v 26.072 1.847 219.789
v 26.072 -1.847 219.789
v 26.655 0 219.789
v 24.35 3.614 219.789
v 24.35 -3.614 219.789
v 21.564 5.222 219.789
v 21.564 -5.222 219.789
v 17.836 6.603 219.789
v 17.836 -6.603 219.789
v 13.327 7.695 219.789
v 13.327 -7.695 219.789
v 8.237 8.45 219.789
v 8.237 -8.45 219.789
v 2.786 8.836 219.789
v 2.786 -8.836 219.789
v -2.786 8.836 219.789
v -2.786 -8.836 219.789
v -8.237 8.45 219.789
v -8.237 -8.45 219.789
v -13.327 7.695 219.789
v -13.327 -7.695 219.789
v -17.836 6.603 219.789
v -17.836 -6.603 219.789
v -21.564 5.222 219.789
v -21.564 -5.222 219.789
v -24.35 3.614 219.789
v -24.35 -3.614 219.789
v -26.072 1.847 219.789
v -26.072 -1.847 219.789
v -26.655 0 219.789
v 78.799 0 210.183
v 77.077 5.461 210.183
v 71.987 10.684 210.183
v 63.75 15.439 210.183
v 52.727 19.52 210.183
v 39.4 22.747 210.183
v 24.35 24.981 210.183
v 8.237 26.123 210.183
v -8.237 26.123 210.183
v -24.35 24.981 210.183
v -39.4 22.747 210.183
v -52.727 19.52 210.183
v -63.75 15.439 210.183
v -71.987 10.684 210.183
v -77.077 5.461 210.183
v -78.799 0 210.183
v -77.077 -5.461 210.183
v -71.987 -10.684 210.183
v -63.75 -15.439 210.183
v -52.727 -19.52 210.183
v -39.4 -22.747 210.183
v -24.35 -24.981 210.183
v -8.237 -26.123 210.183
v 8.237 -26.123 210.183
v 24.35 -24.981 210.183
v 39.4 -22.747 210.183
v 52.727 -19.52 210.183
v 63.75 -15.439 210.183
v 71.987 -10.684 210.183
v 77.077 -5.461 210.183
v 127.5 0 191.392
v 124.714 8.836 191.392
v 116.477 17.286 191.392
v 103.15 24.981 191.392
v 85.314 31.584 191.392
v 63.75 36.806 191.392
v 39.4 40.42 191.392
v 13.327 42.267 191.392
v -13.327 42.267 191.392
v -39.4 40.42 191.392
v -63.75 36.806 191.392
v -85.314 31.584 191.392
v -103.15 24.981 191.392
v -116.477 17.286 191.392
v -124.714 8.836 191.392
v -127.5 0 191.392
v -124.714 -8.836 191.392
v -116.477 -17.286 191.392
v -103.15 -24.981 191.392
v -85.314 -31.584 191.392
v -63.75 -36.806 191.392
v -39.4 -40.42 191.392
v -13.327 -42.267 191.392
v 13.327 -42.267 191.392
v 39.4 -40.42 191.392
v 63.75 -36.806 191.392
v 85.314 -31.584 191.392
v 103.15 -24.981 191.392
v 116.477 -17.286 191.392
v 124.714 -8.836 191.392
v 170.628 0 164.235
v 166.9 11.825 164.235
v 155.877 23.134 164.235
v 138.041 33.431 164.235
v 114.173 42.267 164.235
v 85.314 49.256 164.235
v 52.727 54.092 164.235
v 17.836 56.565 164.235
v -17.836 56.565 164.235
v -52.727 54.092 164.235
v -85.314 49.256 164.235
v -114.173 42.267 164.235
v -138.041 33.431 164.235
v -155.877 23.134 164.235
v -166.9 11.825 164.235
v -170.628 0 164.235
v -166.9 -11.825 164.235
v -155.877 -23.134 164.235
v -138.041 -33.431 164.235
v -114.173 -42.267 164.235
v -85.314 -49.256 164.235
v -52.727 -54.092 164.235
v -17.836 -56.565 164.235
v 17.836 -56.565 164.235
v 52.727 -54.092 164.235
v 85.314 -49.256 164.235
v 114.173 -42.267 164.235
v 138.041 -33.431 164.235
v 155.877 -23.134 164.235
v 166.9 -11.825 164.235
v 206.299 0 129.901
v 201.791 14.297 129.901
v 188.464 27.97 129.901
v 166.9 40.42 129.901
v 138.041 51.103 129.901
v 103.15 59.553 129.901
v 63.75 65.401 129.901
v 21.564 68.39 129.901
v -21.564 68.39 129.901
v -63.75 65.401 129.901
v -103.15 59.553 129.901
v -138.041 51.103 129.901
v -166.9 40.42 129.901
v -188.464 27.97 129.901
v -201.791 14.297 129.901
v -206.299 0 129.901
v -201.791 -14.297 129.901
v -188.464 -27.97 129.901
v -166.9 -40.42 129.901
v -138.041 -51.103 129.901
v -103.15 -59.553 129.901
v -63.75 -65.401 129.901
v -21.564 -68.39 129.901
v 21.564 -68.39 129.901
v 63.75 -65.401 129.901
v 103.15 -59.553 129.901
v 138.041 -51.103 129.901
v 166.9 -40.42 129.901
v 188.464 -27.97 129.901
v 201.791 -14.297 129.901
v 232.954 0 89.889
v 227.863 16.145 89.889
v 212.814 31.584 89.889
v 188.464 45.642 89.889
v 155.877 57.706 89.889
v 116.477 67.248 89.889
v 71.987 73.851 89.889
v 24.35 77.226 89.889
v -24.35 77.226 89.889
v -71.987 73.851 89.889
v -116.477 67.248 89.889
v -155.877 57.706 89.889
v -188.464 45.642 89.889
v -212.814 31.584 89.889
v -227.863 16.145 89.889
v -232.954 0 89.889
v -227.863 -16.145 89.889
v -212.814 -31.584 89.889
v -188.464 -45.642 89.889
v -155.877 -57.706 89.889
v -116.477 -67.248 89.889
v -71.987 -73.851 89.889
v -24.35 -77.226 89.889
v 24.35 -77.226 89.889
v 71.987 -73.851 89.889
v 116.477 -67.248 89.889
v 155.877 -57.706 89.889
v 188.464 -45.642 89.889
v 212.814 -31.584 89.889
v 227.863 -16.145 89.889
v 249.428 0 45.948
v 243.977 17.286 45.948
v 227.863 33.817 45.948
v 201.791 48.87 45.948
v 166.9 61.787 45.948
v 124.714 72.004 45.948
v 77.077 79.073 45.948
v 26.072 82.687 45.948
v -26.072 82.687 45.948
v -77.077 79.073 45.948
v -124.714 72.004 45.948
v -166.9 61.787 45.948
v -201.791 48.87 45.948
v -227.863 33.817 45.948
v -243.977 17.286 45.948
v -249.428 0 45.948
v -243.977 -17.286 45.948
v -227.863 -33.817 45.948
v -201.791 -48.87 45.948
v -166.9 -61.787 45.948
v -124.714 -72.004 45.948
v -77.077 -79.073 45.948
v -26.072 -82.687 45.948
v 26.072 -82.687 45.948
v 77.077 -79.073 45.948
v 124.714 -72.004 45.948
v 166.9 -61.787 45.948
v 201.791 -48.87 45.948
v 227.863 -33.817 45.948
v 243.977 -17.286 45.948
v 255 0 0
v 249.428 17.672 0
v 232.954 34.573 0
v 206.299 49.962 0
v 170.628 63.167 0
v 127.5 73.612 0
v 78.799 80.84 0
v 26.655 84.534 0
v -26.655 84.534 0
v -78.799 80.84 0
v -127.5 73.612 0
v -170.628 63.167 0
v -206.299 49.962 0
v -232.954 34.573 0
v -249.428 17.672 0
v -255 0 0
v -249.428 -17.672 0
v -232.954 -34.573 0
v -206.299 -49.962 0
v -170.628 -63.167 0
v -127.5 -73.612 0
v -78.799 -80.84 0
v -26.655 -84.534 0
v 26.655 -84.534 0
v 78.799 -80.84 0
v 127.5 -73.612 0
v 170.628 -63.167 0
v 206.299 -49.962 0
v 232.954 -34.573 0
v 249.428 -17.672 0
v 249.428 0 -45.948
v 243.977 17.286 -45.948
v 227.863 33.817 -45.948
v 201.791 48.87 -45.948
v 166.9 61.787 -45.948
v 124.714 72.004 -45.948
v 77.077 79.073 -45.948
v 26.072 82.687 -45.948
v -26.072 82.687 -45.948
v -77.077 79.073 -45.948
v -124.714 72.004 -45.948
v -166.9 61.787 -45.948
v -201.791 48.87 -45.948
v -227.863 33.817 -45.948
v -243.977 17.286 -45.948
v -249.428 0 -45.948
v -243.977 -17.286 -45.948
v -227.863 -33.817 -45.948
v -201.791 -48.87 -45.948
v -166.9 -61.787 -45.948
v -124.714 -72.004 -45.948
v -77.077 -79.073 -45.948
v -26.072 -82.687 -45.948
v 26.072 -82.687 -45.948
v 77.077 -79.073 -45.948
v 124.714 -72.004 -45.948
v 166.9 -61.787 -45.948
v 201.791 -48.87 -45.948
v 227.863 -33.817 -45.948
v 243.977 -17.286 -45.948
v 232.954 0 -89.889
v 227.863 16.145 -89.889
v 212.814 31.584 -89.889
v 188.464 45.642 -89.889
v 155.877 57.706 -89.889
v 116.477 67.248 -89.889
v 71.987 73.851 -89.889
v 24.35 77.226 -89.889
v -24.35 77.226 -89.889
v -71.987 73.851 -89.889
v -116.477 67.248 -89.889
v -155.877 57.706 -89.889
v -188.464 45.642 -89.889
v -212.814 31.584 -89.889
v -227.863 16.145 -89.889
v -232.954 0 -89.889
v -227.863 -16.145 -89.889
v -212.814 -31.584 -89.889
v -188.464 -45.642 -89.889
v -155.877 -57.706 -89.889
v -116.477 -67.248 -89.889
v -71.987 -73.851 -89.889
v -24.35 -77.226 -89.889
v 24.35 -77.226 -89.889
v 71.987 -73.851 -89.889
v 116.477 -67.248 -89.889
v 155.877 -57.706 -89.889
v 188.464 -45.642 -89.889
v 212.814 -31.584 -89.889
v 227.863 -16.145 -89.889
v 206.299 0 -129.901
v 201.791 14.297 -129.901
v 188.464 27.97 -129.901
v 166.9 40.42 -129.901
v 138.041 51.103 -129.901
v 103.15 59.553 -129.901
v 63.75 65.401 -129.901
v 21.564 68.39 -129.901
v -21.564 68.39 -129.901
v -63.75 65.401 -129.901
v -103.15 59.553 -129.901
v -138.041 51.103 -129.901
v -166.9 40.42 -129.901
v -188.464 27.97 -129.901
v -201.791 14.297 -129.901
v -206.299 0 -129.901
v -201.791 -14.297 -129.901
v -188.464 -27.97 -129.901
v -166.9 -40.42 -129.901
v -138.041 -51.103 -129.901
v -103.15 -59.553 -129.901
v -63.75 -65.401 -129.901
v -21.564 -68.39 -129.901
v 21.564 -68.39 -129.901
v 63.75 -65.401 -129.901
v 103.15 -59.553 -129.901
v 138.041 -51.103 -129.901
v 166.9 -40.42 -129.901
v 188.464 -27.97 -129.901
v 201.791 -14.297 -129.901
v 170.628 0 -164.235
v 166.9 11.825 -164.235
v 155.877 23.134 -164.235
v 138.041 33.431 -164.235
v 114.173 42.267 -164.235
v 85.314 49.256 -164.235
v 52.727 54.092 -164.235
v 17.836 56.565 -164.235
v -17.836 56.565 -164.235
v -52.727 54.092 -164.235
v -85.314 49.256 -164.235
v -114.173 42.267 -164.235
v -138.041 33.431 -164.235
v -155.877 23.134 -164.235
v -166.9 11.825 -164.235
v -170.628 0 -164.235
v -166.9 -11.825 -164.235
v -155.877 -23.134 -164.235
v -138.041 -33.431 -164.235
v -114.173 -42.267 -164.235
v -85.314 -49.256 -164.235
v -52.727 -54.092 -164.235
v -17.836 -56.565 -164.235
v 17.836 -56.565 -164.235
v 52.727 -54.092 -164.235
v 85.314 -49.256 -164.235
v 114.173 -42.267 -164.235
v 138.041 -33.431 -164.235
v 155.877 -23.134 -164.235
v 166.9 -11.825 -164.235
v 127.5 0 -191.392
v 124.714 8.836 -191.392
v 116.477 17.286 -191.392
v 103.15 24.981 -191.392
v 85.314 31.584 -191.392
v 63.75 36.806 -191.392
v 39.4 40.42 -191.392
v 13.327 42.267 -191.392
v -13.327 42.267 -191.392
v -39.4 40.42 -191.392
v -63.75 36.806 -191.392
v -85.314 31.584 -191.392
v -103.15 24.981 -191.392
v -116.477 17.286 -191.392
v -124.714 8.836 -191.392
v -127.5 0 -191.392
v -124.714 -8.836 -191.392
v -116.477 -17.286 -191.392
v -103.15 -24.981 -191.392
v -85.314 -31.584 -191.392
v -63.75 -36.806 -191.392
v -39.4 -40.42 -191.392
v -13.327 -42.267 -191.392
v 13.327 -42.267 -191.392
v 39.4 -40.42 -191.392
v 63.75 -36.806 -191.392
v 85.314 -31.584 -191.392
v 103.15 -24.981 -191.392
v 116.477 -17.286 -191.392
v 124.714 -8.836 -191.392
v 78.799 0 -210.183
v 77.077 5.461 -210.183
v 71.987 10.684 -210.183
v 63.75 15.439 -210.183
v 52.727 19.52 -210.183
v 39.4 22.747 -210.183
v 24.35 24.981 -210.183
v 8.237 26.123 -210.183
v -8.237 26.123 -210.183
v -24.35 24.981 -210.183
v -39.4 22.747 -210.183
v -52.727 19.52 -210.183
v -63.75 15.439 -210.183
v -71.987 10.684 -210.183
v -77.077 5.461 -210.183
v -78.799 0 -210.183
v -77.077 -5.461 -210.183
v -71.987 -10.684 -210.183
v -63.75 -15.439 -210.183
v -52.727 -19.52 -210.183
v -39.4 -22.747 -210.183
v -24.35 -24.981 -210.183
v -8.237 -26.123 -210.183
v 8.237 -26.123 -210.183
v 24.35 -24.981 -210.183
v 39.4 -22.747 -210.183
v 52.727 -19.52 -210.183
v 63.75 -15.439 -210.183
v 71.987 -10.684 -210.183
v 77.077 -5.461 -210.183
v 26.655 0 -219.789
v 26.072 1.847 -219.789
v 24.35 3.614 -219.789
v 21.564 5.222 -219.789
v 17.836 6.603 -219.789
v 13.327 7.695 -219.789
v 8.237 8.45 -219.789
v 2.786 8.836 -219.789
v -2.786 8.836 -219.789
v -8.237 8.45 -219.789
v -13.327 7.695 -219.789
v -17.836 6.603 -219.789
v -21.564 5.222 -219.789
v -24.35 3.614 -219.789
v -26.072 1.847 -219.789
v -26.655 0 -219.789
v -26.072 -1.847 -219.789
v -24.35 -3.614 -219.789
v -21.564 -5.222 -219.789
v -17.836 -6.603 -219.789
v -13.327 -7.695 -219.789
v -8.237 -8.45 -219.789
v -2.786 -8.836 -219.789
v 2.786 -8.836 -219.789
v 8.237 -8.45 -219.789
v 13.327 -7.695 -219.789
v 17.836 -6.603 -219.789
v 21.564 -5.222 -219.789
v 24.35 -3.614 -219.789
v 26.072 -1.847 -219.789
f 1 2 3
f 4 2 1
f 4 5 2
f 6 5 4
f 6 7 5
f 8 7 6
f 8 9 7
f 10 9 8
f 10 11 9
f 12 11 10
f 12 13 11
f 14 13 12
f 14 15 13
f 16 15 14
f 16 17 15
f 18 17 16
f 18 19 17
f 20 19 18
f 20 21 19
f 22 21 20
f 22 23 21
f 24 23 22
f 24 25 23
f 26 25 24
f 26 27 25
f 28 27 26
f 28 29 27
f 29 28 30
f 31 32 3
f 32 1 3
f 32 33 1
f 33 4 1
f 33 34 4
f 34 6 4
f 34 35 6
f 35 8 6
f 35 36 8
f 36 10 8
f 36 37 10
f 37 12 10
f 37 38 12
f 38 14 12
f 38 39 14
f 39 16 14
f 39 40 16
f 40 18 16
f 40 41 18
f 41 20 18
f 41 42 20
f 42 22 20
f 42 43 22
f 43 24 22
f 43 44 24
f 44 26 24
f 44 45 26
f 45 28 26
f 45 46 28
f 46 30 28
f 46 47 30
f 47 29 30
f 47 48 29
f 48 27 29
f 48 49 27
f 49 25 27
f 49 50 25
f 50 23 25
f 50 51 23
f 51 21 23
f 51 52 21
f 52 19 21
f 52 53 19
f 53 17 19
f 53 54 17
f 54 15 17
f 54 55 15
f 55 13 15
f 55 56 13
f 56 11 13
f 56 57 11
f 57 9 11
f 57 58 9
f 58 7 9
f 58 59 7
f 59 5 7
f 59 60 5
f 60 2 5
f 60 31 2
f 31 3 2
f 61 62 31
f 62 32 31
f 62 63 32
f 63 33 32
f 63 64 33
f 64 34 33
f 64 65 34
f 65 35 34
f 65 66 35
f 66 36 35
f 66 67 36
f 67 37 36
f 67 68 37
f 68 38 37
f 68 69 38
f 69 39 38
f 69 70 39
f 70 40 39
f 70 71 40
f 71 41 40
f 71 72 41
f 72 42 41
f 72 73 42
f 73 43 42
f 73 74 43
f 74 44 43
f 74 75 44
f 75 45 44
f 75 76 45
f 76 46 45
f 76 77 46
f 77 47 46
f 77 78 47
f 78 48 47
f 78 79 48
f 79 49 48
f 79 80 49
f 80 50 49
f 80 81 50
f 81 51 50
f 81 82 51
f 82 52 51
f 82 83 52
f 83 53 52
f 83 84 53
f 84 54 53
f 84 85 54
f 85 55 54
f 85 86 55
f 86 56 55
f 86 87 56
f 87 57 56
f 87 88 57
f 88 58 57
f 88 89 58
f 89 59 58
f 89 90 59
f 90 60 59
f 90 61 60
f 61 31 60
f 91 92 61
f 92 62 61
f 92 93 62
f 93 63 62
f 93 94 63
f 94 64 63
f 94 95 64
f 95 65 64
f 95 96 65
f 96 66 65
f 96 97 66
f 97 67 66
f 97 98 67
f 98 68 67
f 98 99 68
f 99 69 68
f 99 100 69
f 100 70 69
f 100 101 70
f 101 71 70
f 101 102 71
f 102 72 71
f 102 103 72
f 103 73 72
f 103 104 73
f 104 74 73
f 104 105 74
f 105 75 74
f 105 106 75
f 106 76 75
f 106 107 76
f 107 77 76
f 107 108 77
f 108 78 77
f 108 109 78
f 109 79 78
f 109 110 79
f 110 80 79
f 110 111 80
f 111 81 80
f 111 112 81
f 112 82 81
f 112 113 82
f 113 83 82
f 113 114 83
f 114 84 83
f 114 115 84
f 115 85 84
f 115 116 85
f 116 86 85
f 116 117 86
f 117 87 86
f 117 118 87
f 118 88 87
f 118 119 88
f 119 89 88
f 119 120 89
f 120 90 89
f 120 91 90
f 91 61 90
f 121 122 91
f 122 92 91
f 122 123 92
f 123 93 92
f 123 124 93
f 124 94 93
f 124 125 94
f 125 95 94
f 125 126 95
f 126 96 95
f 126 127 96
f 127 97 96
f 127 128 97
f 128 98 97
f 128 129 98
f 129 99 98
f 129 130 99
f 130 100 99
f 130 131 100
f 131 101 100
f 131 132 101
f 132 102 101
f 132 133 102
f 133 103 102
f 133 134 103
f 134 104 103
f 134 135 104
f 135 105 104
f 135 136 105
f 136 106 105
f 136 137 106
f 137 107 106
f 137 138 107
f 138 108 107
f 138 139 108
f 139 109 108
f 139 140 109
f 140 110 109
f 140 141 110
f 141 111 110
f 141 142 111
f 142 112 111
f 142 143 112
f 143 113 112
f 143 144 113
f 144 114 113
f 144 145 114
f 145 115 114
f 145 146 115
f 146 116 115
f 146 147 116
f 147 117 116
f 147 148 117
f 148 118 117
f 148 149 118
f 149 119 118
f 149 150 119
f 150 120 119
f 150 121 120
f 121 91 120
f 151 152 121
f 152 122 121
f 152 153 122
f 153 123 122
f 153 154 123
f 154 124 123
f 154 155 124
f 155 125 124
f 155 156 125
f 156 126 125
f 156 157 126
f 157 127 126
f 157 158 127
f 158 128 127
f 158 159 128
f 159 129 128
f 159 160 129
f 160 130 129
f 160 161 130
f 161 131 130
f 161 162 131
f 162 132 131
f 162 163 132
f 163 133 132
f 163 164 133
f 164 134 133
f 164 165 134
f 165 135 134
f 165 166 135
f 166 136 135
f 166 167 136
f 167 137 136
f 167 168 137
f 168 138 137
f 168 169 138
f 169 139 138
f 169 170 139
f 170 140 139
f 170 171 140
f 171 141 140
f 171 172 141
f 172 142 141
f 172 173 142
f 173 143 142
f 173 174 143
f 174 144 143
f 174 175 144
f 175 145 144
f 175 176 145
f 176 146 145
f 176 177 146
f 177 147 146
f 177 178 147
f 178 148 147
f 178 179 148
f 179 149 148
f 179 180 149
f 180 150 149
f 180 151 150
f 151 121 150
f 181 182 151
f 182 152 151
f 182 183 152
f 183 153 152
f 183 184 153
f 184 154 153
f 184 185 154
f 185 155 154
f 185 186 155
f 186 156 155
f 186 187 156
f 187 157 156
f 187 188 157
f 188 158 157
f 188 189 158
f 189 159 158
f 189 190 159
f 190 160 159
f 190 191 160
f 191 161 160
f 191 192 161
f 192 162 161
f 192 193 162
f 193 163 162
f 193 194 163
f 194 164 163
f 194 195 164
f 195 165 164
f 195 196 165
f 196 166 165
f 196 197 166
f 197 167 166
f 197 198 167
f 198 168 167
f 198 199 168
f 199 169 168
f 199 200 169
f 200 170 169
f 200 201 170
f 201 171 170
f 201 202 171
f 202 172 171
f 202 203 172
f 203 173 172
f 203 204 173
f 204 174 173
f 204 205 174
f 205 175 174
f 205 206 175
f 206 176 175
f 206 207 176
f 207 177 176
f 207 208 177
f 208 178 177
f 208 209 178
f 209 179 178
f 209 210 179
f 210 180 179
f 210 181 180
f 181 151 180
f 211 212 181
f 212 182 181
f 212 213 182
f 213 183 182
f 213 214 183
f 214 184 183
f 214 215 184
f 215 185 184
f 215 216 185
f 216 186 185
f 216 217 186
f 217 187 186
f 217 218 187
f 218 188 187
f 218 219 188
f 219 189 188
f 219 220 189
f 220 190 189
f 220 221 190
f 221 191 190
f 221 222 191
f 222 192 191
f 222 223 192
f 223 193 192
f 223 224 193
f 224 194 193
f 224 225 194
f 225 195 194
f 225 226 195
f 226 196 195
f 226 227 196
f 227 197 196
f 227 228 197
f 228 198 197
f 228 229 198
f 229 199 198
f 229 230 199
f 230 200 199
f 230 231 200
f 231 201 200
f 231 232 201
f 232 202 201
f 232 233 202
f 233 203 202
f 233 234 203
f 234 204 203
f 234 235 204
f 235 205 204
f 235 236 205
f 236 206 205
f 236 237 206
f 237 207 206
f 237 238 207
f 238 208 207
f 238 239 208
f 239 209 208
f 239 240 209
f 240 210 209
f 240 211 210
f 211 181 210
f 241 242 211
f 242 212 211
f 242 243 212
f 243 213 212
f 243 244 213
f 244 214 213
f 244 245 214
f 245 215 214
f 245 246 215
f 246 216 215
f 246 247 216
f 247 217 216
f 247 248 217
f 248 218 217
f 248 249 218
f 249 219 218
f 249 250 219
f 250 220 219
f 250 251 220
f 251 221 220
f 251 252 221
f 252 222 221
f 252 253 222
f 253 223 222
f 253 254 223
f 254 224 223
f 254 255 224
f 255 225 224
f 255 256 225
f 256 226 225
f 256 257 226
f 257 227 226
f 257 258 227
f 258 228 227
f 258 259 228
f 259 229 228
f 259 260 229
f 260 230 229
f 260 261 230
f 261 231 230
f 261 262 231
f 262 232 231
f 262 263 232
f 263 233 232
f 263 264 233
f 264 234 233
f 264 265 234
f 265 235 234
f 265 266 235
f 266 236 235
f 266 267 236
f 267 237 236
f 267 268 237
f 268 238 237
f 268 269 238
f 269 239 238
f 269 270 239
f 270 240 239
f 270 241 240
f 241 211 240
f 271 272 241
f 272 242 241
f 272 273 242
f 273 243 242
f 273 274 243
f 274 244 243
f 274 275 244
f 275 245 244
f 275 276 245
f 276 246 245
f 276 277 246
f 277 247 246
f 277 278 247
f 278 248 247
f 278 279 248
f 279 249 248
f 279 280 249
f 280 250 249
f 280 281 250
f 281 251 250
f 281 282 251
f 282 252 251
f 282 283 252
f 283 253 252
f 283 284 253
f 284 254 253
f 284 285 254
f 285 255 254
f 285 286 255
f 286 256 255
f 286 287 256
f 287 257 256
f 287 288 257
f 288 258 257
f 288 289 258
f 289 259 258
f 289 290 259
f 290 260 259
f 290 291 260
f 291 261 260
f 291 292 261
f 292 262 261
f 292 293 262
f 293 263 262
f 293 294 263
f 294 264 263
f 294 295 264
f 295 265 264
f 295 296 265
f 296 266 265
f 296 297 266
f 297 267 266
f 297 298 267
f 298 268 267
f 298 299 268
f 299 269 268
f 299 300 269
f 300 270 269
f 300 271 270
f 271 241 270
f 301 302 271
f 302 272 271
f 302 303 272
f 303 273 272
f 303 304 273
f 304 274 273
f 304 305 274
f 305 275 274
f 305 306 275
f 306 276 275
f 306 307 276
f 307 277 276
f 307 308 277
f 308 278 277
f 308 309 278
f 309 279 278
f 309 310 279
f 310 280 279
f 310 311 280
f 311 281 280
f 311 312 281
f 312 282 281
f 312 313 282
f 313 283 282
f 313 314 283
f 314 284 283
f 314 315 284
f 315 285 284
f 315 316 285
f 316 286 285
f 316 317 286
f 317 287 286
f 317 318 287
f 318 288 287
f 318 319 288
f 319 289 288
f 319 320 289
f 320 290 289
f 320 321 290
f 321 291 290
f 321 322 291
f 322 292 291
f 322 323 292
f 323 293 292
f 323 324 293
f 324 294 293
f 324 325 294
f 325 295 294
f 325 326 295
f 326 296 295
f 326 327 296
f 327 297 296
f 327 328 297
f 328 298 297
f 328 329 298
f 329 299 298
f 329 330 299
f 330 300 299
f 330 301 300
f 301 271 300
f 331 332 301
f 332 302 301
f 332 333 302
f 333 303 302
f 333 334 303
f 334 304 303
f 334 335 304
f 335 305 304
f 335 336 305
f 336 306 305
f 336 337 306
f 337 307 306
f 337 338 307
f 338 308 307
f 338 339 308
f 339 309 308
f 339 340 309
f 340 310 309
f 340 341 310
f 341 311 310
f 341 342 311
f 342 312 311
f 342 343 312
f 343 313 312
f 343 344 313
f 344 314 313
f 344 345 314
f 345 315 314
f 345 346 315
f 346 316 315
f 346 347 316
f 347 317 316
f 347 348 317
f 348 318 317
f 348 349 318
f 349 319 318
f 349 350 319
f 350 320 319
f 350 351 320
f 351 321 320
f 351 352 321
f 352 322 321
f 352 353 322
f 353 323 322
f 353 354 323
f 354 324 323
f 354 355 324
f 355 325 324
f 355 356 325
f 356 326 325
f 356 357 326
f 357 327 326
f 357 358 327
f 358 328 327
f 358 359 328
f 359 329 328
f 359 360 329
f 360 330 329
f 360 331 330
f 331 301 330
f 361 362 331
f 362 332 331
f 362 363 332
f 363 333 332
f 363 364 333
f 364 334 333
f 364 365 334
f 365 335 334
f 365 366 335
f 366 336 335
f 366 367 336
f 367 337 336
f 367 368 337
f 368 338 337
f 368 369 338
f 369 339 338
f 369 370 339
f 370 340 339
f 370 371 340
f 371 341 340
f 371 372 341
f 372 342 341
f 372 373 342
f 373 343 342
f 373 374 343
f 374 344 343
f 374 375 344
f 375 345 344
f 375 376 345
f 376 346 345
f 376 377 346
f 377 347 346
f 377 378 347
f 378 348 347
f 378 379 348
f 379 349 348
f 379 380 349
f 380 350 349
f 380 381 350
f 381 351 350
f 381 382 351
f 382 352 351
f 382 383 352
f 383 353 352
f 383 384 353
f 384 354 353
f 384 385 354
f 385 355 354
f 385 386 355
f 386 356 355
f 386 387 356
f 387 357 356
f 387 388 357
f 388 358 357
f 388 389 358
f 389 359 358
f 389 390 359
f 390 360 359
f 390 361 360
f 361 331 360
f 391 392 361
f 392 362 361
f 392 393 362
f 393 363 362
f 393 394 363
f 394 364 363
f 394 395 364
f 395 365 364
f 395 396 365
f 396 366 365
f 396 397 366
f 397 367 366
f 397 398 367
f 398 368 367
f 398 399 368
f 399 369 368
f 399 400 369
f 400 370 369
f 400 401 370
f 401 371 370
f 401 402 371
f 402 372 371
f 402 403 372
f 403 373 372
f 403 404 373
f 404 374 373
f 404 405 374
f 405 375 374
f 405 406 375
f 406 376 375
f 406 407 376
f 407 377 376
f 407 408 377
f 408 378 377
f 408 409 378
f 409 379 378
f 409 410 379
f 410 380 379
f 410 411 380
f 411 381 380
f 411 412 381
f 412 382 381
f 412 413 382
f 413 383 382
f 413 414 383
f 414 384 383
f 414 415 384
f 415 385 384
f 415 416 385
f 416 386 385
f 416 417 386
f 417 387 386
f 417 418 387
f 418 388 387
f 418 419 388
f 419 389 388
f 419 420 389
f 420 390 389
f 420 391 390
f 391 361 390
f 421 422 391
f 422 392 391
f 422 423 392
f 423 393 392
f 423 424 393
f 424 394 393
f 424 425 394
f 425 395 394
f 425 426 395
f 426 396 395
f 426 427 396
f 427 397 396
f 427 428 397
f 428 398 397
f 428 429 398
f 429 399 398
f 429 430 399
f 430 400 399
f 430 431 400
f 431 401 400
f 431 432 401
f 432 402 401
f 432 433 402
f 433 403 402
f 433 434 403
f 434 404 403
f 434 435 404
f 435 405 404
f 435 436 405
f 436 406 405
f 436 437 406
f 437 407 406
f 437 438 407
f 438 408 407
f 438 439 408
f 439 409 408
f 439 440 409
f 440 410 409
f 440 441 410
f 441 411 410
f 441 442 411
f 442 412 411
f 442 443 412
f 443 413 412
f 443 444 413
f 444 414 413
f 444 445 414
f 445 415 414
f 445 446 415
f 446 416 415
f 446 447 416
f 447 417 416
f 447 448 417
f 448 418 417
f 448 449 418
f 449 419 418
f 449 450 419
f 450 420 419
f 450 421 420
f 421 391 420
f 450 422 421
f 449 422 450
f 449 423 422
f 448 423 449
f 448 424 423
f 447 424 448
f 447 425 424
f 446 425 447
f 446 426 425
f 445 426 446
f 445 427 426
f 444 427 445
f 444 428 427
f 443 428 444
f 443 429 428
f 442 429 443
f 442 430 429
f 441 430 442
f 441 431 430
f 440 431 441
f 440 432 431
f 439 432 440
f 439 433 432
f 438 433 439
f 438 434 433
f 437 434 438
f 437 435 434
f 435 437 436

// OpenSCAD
// Generated by SolidPython 1.0.1 on 2020-07-29 00:46:51


scale(v = [15, 5, 13]) {
	sphere(r = 17);
}
/***********************************************
*********      SolidPython code:      **********
************************************************
 
# import packages: SolidPython
from solid import *
from solid.utils import *
from itertools import chain, combinations, permutations


class Resize:

    def __init__(self, scad_file):
        self.scad_file = scad_file
        #self.scad_file = import_scad(scad_file)
        # cone/cylinder param:
        self.r1 = 0
        self.r2 = 0
        self.h = 0
        # rectangular prism param:
        self.w = 0
        self.l = 0
        # ellipse param:
        self.r = 0

    # import OpenScad code (file name corresponds to shape)


    # classify shape + parameters
    def assign(self, param1, param2, param3):
        if self.scad_file == 'cone.scad':
            self.r1 = param1
            self.r2 = param2
            self.h = param3
        elif self.scad_file == 'cylinder.scad':
            self.r1 = param1
            self.r2 = param2
            self.h = param3
        elif self.scad_file == 'rectangularPrism.scad':
            self.h = param1
            self.l = param2
            self.w = param3
        else:
            self.r = param1
            self.h = param2

    # resize parameters
    def iterate(self):
        x = range(3, 20, 2)
        i = 1
        if self.scad_file == 'cone.scad':
            tempList = list(permutations(x, 2))
            for temp in tempList:
                param1 = temp[0]
                param2 = temp[1]
                filepath = 'produced_scad_files/' + 'cone' + str(param1) + '_' + str(param2) + '_' + '.scad'
                scad_render_to_file(cylinder(h=param1, r1=param2, r2=0), filepath)

        elif self.scad_file == 'cylinder.scad':
            tempList = list(permutations(x, 3))
            for temp in tempList:
                param1 = temp[0]
                param2 = temp[1]
                filepath = 'produced_scad_files/' + 'cylinder' + str(param1) + '_' + str(param2) + '_' + '.scad'
                scad_render_to_file(cylinder(h=param1, r1=param2, r2=param2), filepath)

        elif self.scad_file == 'rectangularPrism.scad':
            tempList = list(permutations(x, 3))
            for temp in tempList:
                param1 = temp[0]
                param2 = temp[1]
                param3 = temp[2]
                filepath = 'produced_scad_files/' + 'rectangularPrism' + str(param1) + '_' + str(param2) + '_' + str(
                    param3) + '.scad'
                scad_render_to_file(cube(size=(param1, param2, param3)), filepath)

        elif self.scad_file == 'ellipse.scad':
            tempList = list(permutations(x, 4))
            for temp in tempList:
                param1 = temp[0]
                param2 = temp[1]
                param3 = temp[2]
                param4 = temp[3]
                filepath = 'produced_scad_files/' + 'ellipse' + str(param1) + '_' + str(param2) + '_' + str(param3) + '_' + str(param4) + '.scad'
                scad_render_to_file(scale([param1, param2, param3])(sphere(r=param4)), filepath)

    def render_to_scadfile(self):
        scad_render_to_file(scad, 'example.scad') 
 
************************************************/
